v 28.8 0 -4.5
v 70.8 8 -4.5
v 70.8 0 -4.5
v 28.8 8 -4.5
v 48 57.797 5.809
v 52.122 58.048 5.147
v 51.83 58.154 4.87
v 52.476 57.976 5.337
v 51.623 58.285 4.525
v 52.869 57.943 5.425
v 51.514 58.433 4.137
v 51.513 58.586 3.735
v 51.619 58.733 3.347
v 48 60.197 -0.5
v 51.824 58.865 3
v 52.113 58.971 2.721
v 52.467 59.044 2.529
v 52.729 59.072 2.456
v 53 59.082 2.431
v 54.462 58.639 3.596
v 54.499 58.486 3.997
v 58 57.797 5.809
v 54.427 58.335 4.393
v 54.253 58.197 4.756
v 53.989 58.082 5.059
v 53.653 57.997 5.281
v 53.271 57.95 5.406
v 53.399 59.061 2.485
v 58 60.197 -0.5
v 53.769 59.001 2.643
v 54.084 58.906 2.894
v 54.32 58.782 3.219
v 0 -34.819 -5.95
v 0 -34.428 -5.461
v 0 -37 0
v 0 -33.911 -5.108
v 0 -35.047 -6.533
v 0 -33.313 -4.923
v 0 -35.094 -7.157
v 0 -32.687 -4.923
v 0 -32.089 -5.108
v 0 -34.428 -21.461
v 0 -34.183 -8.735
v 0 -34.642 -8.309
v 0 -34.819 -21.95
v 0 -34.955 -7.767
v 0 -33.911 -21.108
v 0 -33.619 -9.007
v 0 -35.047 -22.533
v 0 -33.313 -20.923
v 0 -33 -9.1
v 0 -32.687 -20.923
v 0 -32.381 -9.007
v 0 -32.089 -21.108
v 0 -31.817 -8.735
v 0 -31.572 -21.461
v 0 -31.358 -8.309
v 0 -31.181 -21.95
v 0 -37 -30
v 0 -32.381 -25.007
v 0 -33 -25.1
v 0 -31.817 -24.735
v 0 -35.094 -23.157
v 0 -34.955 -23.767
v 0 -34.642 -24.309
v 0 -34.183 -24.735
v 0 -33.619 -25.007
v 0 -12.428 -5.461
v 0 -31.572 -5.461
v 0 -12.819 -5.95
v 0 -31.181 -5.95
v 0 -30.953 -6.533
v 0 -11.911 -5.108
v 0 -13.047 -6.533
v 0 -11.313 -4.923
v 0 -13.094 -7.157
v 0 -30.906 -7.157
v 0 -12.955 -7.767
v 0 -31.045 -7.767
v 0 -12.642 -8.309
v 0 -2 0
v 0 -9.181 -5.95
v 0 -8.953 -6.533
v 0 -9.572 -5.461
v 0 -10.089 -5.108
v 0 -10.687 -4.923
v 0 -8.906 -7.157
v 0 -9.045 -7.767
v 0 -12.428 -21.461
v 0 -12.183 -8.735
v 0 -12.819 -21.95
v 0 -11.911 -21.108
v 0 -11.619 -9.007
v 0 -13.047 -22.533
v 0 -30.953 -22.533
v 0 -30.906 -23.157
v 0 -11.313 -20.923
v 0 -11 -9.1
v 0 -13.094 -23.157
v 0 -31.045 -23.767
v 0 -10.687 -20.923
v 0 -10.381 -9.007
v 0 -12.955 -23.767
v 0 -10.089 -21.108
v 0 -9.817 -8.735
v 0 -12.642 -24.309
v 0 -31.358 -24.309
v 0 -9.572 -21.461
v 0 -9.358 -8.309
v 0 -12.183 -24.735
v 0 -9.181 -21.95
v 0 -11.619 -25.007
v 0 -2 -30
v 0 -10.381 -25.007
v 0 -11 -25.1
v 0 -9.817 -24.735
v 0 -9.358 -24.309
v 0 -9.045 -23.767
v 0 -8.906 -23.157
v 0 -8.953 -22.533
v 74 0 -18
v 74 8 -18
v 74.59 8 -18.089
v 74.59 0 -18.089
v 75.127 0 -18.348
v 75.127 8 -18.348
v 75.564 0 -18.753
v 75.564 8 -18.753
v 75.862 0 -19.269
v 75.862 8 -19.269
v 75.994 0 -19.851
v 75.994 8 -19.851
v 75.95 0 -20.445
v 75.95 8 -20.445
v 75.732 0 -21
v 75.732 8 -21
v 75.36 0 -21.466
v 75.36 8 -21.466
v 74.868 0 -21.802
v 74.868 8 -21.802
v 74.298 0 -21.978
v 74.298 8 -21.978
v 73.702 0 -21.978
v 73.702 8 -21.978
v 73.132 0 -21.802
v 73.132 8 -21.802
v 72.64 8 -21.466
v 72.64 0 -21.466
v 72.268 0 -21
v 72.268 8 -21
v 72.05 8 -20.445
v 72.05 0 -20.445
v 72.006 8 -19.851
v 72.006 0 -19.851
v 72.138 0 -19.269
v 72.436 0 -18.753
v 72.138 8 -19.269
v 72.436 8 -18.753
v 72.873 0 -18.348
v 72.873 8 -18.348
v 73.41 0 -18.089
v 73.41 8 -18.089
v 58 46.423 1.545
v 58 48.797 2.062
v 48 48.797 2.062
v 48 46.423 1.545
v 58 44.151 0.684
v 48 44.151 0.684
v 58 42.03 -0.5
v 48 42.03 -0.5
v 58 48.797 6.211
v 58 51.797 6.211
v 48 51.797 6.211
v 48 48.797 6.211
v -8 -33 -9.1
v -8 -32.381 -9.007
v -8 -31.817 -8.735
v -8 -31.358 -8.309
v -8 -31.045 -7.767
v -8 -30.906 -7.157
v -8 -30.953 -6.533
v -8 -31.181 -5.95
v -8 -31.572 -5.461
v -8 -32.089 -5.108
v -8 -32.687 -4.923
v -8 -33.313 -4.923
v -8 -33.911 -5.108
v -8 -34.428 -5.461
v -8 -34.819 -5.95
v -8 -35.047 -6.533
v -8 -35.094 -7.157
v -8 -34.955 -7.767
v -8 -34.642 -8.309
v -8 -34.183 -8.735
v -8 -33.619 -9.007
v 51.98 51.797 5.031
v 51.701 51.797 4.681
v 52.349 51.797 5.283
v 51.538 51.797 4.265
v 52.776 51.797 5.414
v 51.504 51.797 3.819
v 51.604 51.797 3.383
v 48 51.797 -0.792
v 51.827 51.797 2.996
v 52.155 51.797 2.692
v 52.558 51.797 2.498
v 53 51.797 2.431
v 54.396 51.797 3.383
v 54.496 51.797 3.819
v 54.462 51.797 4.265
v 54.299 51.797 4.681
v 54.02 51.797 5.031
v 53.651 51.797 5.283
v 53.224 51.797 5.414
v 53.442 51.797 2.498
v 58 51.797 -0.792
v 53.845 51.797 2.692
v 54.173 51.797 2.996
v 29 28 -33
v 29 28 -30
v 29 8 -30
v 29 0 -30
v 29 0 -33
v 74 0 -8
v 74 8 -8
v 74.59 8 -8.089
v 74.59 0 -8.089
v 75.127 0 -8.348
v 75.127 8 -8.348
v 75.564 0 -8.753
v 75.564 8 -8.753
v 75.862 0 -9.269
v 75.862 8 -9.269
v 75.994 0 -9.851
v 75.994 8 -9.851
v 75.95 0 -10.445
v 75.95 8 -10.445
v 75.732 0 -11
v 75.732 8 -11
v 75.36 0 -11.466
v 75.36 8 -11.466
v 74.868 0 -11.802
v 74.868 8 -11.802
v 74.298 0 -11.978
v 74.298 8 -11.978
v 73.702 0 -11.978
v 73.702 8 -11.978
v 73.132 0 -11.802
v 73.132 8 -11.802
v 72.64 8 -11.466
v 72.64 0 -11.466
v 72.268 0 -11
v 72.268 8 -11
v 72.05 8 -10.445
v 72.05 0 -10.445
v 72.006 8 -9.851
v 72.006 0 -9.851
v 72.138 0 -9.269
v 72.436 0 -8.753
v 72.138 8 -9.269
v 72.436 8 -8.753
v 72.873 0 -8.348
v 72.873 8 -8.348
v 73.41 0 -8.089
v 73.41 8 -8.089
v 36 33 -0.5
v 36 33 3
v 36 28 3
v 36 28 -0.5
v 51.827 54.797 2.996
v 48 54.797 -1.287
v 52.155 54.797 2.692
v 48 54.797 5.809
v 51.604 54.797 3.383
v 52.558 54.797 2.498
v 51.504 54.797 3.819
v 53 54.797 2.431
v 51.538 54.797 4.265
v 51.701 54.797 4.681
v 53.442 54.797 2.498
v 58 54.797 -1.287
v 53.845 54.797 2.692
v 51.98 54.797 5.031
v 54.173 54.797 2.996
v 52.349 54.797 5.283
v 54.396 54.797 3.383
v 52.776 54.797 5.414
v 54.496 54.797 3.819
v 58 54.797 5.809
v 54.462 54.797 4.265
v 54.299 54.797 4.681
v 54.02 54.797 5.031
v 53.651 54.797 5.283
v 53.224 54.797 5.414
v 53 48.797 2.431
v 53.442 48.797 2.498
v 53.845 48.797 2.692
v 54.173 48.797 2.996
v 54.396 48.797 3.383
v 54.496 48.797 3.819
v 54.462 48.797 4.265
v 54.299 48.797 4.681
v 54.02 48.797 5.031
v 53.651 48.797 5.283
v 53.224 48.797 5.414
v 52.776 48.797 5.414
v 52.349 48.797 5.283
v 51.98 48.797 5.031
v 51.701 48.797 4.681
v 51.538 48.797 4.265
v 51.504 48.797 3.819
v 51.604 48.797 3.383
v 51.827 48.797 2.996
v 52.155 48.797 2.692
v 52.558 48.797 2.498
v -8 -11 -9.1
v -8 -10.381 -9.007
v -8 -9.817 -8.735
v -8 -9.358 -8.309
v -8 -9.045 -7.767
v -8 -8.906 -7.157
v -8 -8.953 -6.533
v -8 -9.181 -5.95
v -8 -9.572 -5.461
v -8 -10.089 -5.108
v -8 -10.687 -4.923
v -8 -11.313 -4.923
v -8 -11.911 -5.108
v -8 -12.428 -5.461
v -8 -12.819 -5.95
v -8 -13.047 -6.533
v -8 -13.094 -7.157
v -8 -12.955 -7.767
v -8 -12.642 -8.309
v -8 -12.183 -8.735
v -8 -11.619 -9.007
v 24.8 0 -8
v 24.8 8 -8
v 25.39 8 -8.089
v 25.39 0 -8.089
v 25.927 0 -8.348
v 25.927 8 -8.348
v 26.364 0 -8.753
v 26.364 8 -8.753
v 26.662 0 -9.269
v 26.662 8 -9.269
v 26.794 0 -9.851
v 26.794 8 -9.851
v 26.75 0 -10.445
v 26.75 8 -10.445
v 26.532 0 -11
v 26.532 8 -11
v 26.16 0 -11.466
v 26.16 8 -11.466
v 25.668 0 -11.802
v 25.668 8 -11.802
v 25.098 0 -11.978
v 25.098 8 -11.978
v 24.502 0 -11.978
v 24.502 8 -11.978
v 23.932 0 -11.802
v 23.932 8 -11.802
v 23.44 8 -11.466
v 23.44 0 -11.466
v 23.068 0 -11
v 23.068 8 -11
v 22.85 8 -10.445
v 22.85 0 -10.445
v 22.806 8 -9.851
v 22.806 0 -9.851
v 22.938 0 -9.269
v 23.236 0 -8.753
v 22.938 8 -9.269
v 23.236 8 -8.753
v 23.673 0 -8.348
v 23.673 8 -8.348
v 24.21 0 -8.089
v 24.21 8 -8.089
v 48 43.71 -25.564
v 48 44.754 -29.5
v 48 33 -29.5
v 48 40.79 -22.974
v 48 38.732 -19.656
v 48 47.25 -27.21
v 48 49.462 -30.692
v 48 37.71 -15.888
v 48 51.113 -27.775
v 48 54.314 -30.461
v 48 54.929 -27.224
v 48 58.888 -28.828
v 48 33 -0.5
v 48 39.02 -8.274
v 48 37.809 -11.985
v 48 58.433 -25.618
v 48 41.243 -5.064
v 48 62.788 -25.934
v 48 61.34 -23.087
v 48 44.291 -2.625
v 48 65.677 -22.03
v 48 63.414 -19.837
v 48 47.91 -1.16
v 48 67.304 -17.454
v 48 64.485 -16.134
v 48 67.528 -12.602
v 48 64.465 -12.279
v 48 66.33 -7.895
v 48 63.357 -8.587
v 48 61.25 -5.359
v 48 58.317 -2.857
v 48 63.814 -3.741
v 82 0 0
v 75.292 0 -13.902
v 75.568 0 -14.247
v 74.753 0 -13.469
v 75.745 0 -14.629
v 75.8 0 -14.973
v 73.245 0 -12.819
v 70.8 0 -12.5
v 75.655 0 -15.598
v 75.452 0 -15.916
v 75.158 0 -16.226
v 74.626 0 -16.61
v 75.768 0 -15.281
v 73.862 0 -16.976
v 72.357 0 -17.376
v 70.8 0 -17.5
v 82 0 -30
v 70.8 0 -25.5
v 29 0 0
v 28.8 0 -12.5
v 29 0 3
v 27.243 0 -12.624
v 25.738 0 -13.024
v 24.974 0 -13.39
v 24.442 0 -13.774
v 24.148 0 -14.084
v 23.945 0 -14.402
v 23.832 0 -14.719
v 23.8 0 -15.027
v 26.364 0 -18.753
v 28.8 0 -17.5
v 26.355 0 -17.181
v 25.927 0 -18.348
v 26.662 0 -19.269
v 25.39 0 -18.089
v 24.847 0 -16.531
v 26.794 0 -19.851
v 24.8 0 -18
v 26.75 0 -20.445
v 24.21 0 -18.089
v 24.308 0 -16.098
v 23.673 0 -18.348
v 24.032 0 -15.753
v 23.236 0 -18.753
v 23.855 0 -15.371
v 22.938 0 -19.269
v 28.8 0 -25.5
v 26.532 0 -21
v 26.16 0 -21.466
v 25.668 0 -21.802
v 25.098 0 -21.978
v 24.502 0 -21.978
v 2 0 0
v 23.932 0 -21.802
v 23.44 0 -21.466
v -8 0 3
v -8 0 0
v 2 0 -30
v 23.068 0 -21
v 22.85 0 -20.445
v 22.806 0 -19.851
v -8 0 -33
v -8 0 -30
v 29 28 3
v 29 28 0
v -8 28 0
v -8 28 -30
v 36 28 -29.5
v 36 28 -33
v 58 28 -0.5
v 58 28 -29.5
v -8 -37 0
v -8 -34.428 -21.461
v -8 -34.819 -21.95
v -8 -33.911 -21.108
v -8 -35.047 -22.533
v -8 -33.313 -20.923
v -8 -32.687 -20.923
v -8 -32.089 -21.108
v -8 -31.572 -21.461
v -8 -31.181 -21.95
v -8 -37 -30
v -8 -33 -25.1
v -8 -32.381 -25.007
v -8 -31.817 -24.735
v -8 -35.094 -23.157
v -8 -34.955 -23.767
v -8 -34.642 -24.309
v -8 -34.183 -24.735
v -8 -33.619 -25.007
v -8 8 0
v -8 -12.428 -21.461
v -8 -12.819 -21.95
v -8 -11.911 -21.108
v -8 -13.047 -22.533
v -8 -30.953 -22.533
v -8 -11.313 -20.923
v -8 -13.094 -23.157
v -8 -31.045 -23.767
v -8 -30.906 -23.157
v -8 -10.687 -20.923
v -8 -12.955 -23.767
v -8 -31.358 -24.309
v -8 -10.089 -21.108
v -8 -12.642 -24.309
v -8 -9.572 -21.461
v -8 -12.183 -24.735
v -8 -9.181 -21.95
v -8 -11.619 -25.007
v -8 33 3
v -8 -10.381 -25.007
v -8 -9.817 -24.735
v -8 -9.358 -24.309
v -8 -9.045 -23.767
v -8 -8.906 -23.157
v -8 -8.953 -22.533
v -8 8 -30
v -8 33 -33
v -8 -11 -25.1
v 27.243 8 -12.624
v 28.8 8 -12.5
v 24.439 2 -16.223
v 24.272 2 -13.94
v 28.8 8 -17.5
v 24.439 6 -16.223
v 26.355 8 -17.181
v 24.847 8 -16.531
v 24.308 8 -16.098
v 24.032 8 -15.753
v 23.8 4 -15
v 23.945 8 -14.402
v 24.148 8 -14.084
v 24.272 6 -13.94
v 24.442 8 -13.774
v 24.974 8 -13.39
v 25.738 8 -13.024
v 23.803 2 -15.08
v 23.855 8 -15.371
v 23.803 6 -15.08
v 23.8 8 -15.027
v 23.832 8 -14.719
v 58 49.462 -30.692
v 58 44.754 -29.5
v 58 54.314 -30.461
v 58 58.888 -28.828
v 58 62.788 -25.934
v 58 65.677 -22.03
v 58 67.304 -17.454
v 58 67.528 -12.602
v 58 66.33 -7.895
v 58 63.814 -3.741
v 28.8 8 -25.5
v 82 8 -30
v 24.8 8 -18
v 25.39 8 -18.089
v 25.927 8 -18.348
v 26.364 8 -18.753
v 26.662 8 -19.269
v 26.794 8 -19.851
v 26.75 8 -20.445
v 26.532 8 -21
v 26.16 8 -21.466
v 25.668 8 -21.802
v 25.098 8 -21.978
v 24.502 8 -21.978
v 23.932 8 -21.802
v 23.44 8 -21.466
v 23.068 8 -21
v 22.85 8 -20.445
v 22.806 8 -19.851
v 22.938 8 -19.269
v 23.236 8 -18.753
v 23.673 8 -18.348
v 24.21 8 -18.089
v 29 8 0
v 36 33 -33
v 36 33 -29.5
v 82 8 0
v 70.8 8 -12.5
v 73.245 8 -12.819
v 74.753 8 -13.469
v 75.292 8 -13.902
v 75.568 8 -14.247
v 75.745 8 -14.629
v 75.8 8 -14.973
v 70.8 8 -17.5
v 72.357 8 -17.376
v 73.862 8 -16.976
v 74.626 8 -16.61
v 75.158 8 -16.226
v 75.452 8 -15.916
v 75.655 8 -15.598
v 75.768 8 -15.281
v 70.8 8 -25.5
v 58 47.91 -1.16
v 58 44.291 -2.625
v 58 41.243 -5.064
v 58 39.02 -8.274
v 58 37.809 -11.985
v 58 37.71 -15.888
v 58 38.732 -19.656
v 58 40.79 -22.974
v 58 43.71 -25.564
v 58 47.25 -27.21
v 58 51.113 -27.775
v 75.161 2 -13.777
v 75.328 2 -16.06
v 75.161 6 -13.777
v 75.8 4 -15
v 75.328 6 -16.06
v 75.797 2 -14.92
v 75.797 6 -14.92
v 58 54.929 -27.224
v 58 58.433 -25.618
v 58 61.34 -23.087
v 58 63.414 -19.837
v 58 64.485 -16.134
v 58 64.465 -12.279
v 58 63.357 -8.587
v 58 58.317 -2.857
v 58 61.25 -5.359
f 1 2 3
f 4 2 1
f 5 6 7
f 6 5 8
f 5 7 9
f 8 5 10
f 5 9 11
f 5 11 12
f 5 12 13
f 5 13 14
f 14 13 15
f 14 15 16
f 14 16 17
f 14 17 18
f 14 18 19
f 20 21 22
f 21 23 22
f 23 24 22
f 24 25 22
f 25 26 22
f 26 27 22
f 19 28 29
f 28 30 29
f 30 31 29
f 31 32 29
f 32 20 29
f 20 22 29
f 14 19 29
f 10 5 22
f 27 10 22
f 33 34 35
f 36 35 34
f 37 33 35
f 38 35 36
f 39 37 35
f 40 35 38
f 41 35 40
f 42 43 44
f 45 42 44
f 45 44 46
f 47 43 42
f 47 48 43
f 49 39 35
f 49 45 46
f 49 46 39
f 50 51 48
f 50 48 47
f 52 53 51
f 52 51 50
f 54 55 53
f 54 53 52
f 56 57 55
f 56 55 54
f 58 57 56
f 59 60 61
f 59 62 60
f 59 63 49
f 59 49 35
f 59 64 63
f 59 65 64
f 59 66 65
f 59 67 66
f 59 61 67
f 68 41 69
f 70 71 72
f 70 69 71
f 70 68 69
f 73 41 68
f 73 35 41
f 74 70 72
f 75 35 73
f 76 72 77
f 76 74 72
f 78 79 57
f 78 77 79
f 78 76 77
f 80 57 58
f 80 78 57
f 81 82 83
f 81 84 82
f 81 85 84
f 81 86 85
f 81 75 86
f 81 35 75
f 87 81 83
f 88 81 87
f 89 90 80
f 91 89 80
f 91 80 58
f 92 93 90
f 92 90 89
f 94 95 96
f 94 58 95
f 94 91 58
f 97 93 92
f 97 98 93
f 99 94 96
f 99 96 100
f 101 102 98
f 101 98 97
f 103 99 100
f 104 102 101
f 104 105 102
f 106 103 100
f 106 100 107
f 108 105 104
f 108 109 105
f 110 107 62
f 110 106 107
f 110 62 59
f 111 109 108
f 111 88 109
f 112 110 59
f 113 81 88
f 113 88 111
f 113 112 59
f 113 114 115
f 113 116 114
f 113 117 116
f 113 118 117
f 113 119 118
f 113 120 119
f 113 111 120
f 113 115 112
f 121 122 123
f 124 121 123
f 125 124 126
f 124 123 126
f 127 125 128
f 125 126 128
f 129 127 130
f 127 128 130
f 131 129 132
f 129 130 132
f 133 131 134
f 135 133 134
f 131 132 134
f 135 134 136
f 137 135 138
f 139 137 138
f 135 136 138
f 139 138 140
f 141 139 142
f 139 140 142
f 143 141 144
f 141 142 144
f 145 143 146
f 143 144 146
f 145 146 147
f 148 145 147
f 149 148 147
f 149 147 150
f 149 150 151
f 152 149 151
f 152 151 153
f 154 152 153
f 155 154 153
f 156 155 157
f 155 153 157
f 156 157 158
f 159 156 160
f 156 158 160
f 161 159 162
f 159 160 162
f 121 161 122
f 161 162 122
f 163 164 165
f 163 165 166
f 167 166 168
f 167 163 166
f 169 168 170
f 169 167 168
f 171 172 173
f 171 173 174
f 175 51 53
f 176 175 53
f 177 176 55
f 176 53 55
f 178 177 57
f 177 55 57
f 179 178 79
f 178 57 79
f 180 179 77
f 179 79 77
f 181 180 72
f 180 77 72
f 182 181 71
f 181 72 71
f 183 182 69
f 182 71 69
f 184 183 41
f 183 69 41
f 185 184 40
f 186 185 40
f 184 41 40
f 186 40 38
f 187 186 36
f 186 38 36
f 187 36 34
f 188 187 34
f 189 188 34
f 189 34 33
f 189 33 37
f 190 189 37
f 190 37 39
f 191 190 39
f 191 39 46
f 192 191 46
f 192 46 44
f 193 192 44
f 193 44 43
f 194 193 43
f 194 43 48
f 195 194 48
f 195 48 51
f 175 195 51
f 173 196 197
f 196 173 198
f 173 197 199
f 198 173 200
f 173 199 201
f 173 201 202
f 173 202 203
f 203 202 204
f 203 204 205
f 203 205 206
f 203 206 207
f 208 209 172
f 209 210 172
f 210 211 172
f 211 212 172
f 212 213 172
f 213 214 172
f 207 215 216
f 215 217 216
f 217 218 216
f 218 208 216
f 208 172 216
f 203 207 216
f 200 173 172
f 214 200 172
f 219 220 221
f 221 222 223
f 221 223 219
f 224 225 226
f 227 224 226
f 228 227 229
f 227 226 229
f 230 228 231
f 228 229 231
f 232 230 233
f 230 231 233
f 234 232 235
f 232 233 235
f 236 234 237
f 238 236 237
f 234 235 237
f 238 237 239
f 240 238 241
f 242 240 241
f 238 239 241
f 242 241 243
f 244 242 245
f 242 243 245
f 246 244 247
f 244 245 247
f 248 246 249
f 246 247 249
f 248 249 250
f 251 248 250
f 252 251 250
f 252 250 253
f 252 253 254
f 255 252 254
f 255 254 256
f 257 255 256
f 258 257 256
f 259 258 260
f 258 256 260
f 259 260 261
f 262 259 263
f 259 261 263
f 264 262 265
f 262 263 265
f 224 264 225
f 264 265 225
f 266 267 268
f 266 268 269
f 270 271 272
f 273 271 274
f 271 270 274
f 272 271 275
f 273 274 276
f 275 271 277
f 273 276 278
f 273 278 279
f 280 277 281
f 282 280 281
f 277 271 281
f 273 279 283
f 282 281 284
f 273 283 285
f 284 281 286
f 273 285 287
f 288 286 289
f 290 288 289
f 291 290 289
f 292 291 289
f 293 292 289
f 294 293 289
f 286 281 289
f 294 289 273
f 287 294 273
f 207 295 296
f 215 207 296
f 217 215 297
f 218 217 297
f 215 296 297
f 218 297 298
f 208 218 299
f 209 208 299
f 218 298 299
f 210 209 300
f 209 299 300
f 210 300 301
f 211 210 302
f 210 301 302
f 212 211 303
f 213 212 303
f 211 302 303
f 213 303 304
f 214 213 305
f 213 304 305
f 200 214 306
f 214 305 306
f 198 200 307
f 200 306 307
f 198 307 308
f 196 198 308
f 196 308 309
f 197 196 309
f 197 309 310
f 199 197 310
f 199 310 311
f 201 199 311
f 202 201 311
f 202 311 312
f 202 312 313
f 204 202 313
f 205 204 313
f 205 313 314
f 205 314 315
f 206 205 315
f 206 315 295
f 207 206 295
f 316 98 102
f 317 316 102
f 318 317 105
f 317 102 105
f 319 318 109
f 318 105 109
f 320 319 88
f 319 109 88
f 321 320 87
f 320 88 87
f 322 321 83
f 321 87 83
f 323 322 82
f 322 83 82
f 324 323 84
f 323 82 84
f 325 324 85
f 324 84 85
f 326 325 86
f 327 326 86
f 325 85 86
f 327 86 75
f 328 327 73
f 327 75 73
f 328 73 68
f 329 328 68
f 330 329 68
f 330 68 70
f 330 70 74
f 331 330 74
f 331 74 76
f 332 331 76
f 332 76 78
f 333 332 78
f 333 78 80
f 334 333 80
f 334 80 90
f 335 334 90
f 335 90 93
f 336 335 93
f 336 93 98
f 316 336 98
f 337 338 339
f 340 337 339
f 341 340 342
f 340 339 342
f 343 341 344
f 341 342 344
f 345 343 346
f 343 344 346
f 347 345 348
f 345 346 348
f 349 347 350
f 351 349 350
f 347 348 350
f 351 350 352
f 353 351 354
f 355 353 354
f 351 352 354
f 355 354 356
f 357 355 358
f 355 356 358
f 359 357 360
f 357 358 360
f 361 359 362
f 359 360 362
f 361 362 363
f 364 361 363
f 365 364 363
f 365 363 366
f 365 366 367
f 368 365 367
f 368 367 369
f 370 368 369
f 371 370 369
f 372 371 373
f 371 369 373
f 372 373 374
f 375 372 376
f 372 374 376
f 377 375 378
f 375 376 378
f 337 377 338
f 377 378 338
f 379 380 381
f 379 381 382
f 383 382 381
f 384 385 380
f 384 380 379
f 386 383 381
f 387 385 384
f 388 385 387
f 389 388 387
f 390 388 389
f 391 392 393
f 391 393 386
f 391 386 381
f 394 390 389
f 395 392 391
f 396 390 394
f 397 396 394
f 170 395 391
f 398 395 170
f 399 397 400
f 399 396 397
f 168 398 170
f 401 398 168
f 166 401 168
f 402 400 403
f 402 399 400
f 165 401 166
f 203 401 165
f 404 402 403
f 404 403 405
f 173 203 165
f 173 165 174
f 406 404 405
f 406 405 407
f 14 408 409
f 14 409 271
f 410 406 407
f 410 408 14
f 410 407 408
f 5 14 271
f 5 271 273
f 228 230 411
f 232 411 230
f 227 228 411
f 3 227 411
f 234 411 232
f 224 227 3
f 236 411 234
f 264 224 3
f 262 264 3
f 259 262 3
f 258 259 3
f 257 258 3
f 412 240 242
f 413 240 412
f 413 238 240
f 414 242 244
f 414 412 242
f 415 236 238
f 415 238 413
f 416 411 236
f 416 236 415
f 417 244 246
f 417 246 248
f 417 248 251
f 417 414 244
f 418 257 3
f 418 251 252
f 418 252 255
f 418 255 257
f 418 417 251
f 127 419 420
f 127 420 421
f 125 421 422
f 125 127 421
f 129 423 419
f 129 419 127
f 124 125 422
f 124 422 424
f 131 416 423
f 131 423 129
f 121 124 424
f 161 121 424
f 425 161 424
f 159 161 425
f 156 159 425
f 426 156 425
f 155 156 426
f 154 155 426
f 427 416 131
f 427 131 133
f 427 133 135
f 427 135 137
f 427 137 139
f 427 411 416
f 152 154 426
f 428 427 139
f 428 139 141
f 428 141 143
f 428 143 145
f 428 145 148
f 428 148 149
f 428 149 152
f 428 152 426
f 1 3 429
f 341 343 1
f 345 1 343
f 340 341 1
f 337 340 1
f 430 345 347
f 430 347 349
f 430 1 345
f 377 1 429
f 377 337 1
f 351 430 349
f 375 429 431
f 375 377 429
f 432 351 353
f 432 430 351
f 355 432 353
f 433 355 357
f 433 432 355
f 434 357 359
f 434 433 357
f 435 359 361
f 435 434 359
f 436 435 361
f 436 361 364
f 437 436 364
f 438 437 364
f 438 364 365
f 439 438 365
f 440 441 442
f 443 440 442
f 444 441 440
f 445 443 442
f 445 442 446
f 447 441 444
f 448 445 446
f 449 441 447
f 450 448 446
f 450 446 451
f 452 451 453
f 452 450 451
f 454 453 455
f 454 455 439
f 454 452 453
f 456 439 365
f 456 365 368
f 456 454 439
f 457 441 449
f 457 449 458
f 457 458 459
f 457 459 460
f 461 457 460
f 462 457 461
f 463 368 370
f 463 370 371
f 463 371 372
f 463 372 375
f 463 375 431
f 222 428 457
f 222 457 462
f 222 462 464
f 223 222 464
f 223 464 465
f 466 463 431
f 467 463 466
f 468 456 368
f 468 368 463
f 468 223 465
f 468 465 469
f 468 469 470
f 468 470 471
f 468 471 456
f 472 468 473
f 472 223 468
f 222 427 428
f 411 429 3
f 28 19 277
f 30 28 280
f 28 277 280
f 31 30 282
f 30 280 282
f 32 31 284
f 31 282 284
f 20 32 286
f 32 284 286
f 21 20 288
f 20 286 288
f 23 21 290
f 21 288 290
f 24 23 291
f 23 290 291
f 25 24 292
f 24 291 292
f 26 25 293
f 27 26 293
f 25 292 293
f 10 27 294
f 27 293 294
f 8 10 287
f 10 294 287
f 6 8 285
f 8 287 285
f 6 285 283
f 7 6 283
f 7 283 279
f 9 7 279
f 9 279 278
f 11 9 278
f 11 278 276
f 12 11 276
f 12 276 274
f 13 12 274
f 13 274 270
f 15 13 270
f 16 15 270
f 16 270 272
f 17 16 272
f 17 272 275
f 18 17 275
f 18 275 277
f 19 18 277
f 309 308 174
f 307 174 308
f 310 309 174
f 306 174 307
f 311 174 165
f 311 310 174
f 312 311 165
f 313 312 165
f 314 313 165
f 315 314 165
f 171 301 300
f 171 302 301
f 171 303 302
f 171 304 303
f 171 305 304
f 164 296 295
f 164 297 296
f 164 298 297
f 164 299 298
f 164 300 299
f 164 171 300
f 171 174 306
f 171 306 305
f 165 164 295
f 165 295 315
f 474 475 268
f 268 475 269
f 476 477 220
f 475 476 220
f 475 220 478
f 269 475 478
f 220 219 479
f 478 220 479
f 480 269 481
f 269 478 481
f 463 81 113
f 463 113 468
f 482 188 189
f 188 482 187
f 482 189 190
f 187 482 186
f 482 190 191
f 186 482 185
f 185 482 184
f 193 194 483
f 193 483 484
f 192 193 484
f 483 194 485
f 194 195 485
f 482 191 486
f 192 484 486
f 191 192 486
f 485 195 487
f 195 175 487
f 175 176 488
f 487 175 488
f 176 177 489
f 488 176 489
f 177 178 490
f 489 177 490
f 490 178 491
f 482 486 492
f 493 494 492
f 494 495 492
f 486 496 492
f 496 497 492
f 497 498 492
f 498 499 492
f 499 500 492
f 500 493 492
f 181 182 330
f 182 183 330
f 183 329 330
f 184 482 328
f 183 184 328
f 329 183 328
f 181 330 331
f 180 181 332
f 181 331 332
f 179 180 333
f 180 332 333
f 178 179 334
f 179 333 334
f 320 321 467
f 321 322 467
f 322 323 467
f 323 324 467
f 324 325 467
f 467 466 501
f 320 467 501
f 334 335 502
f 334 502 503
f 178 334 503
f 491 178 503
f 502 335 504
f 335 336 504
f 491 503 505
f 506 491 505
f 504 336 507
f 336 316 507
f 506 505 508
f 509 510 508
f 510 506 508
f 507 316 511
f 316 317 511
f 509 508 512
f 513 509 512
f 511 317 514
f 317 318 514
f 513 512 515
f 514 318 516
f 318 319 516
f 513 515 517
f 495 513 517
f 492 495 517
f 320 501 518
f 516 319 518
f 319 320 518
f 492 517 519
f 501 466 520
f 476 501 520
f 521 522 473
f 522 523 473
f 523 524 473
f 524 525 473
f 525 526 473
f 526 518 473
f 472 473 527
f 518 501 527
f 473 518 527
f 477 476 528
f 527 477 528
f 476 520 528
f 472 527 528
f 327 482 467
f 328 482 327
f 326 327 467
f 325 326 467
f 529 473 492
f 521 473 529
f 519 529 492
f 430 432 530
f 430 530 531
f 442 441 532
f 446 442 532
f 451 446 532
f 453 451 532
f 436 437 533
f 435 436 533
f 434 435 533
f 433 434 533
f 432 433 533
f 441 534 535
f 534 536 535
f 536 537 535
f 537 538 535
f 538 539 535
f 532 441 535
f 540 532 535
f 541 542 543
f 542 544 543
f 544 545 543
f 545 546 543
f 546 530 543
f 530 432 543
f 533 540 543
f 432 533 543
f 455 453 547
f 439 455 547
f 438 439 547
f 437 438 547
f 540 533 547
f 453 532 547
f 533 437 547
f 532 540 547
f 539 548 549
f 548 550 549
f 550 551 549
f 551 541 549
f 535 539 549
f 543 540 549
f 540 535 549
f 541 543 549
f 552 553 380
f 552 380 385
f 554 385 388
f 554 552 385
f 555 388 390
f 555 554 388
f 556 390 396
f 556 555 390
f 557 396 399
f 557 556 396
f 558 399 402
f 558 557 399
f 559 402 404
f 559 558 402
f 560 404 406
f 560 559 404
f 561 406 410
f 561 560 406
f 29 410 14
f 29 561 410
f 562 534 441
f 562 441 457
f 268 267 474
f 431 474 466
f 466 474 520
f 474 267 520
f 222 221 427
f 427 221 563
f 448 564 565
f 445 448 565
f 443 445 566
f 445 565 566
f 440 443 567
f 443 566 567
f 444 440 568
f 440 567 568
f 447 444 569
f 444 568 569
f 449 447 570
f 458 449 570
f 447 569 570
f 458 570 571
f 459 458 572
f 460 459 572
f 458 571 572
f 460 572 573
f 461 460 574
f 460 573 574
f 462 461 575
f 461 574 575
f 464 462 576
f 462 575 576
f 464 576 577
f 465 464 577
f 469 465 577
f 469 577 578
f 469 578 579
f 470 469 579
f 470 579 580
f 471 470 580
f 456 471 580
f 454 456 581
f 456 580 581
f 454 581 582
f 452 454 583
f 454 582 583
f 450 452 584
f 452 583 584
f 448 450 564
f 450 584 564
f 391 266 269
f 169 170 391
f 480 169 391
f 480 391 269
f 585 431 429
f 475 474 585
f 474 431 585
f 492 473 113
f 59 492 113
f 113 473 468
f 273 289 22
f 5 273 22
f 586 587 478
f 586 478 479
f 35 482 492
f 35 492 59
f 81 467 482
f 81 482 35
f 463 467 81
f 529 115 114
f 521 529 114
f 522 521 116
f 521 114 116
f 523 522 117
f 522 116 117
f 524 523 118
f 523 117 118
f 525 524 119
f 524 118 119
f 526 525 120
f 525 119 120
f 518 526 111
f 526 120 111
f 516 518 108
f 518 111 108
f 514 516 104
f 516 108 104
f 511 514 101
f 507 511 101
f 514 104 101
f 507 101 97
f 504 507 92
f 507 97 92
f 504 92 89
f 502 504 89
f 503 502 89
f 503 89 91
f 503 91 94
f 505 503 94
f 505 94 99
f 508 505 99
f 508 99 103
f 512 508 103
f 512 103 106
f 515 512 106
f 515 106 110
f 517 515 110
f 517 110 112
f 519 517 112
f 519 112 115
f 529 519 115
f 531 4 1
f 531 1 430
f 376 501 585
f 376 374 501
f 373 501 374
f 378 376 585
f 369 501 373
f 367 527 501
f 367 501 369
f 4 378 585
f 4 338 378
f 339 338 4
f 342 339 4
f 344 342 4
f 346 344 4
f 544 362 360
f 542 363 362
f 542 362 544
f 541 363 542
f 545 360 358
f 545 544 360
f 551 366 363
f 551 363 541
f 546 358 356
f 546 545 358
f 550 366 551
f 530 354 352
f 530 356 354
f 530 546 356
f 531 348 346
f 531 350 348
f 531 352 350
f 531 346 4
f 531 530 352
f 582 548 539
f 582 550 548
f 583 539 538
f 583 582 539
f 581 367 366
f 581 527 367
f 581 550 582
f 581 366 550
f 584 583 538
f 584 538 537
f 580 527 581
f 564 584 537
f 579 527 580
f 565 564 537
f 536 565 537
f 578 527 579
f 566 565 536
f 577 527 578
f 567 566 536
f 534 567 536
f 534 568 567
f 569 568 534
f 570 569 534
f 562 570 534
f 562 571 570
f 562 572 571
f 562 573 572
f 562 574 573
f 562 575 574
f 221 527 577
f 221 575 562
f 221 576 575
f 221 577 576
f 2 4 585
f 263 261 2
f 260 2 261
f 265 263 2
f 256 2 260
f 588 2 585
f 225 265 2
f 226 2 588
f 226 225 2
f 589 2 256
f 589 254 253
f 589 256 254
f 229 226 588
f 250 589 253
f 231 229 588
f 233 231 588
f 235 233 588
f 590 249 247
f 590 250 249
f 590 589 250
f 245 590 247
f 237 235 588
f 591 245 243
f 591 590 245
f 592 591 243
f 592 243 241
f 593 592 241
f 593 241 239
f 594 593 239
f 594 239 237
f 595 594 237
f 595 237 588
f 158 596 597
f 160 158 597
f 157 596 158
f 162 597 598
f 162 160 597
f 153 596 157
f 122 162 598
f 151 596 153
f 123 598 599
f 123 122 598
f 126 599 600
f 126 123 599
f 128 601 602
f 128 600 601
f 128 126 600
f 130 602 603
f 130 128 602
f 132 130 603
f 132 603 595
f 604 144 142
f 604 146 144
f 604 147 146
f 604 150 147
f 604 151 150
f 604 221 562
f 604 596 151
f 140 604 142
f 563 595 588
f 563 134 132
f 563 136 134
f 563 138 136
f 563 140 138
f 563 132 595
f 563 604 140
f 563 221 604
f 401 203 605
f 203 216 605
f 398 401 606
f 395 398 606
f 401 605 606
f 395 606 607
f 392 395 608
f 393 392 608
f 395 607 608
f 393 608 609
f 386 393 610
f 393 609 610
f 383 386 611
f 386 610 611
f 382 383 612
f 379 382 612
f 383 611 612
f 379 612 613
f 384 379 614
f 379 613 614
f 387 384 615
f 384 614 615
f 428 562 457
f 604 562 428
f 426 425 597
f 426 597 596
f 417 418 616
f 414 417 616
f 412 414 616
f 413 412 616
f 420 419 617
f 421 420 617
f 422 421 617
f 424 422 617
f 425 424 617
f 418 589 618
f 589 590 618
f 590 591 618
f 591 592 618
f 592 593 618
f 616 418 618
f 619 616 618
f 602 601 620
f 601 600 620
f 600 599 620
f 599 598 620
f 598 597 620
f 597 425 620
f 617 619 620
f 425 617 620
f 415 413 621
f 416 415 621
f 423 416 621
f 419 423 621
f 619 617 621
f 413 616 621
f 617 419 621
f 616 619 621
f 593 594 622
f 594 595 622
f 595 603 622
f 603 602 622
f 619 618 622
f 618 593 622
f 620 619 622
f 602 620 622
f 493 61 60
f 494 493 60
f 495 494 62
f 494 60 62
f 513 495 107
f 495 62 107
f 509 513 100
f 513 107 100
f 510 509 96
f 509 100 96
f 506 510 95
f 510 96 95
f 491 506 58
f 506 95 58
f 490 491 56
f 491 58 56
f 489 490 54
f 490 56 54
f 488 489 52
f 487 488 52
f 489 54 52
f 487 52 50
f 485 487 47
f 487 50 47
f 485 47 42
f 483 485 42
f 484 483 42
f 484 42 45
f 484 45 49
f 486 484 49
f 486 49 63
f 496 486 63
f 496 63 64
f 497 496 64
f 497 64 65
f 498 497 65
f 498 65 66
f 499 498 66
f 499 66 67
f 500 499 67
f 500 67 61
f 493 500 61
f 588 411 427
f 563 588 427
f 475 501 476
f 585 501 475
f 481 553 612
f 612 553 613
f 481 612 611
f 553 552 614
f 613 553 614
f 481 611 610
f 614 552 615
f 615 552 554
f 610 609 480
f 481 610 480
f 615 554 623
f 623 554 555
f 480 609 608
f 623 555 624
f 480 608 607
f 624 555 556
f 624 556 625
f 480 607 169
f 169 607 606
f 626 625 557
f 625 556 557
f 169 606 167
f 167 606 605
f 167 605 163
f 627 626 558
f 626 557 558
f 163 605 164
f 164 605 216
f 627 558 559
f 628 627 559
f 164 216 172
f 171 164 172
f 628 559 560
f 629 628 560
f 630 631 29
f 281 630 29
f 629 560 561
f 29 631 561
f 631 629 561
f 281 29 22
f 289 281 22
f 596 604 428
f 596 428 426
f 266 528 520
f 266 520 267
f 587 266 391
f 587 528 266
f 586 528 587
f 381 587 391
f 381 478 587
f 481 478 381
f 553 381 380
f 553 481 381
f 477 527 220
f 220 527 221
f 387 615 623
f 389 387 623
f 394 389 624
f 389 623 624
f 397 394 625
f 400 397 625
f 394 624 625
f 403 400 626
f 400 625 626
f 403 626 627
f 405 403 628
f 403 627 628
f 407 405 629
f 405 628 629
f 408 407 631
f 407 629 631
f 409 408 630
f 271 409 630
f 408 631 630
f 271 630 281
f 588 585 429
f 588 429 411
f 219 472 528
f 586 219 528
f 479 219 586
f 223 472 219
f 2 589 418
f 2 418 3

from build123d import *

# Parameters (mm, degrees)
SKETCH_1_W          = 82
SKETCH_1_H          = 30
EXTRUDE_1_DEPTH     = 8
SKETCH_2_R          = 2
CUT_EXTRUDE_1_DEPTH = 8
SKETCH_4_W          = 8
SKETCH_4_H          = 30
EXTRUDE_2_DEPTH     = 45
EXTRUDE_5_DEPTH     = 30
SKETCH_15_R         = 2.1
CUT_EXTRUDE_2_DEPTH = 10
SKETCH_17_W         = 37
SKETCH_17_H         = 3
EXTRUDE_6_DEPTH     = 20
EXTRUDE_6_2_DEPTH   = 20
SKETCH_18_W         = 66
SKETCH_18_H         = 36
EXTRUDE_7_DEPTH     = 5
SKETCH_19_W         = 37
SKETCH_19_H         = 3
EXTRUDE_8_DEPTH     = 8
SKETCH_20_W         = 22
SKETCH_20_H         = 3.5
CUT_EXTRUDE_3_DEPTH = 5
SKETCH_21_R         = 16.5
SKETCH_21_R_2       = 13.5
EXTRUDE_9_DEPTH     = 10
SKETCH_22_W         = 9.765091575
SKETCH_22_H         = 3
CUT_EXTRUDE_4_DEPTH = 10
EXTRUDE_10_DEPTH    = 10
SKETCH_24_R         = 1.5
CUT_EXTRUDE_5_DEPTH = 15


with BuildPart() as part:
    # 草圖1 → 填料-伸長1 (new body)
    with BuildSketch(Plane(origin=(0, 0, 0), x_dir=(1, 0, 0), z_dir=(0, 1, 0))):
        with Locations((41, 15)):
            Rectangle(SKETCH_1_W, SKETCH_1_H)
    extrude(amount=EXTRUDE_1_DEPTH)

    # 草圖2 → 除料-伸長1 (cut)
    with BuildSketch(Plane(origin=(0, 8, 0), x_dir=(1, 0, 0), z_dir=(0, 1, 0))):
        with Locations(Location((74, 20, 0), (0, 0, 270))):
            Circle(SKETCH_2_R)
        with Locations(Location((74, 10, 0), (0, 0, 270))):
            Circle(SKETCH_2_R)
        with Locations(Location((24.8, 20, 0), (0, 0, 270))):
            Circle(SKETCH_2_R)
        with Locations(Location((24.8, 10, 0), (0, 0, 270))):
            Circle(SKETCH_2_R)
        with BuildLine():
            Line((28.8, 25.5), (70.8, 25.5))
            Line((70.8, 25.5), (70.8, 17.5))
            add(Edge.make_bspline(
                [(70.8, 12.5), (75.8, 12.5), (75.8, 15), (75.8, 17.5), (70.8, 17.5)],
                knots=[4.71238898, 4.71238898, 4.71238898, 6.283185307, 6.283185307, 7.853981634, 7.853981634, 7.853981634], degree=2, weights=[1, 0.707106781, 1, 0.707106781, 1]))
            Line((70.8, 12.5), (70.8, 4.5))
            Line((70.8, 4.5), (28.8, 4.5))
            Line((28.8, 4.5), (28.8, 12.5))
            add(Edge.make_bspline(
                [(28.8, 17.5), (23.8, 17.5), (23.8, 15), (23.8, 12.5), (28.8, 12.5)],
                knots=[1.570796327, 1.570796327, 1.570796327, 3.141592654, 3.141592654, 4.71238898, 4.71238898, 4.71238898], degree=2, weights=[1, 0.707106781, 1, 0.707106781, 1]))
            Line((28.8, 17.5), (28.8, 25.5))
        make_face()
    extrude(amount=-CUT_EXTRUDE_1_DEPTH, mode=Mode.SUBTRACT)

    # 草圖4 → 填料-伸長2 (add)
    with BuildSketch(Plane(origin=(0, 8, 0), x_dir=(1, 0, 0), z_dir=(0, 1, 0))):
        with Locations((-4, 15)):
            Rectangle(SKETCH_4_W, SKETCH_4_H)
    extrude(amount=-EXTRUDE_2_DEPTH)

    # 草圖14 → 填料-伸長5 (add)
    with BuildSketch(Plane.XY):
        Polygon((0, 0), (0, -2), (2, 0), align=None)
    extrude(amount=-EXTRUDE_5_DEPTH)

    # 草圖15 → 除料-伸長2 (cut)
    with BuildSketch(Plane(origin=(0, 0, 0), x_dir=(0, 0, -1), z_dir=(1, 0, 0))):
        with Locations((7, -33)):
            Circle(SKETCH_15_R)
        with Locations((7, -11)):
            Circle(SKETCH_15_R)
        with Locations((23, -11)):
            Circle(SKETCH_15_R)
        with Locations((23, -33)):
            Circle(SKETCH_15_R)
    extrude(amount=-CUT_EXTRUDE_2_DEPTH, mode=Mode.SUBTRACT)



with BuildPart() as body_2:
    # 草圖17 → 填料-伸長6 (new body)
    with BuildSketch(Plane(origin=(0, 8, 0), x_dir=(1, 0, 0), z_dir=(0, 1, 0))):
        with Locations((10.5, -1.5)):
            Rectangle(SKETCH_17_W, SKETCH_17_H)
    extrude(amount=EXTRUDE_6_DEPTH)



with BuildPart() as body_3:
    # 草圖17 → Extrude 6 2 (new body)
    with BuildSketch(Plane(origin=(0, 8, 0), x_dir=(1, 0, 0), z_dir=(0, 1, 0))):
        with Locations((10.5, 31.5)):
            Rectangle(SKETCH_17_W, SKETCH_17_H)
    extrude(amount=EXTRUDE_6_2_DEPTH)


with BuildPart() as body_2_1:
    add(body_2.part)

    add(body_3.part)  # 填料-伸長7 merges body 3
    # 草圖18 → 填料-伸長7 (add)
    with BuildSketch(Plane(origin=(0, 28, 0), x_dir=(1, 0, 0), z_dir=(0, 1, 0))):
        with Locations((25, 15)):
            Rectangle(SKETCH_18_W, SKETCH_18_H)
    extrude(amount=EXTRUDE_7_DEPTH)


with BuildPart() as part_1:
    add(part.part)

    add(body_2_1.part)  # 填料-伸長8 merges body 2
    # 草圖19 → 填料-伸長8 (add)
    with BuildSketch(Plane(origin=(0, 8, 0), x_dir=(-1, 0, 0), z_dir=(0, -1, 0))):
        with Locations((-10.5, -1.5)):
            Rectangle(SKETCH_19_W, SKETCH_19_H)
        with Locations((-10.5, 31.5)):
            Rectangle(SKETCH_19_W, SKETCH_19_H)
    extrude(amount=EXTRUDE_8_DEPTH)

    # 草圖20 → 除料-伸長3 (cut)
    with BuildSketch(Plane(origin=(0, 33, 0), x_dir=(1, 0, 0), z_dir=(0, 1, 0))):
        with Locations((47, 31.25)):
            Rectangle(SKETCH_20_W, SKETCH_20_H)
        with Locations((47, -1.25)):
            Rectangle(SKETCH_20_W, SKETCH_20_H)
    extrude(amount=-CUT_EXTRUDE_3_DEPTH, mode=Mode.SUBTRACT)



with BuildPart() as body_2_2:
    # 草圖21 → 填料-伸長9 (new body)
    with BuildSketch(Plane(origin=(58, 0, 0), x_dir=(0, 0, -1), z_dir=(1, 0, 0))):
        with Locations((14.274721253, 51.113330164)):
            Circle(SKETCH_21_R)
        with Locations((14.274721253, 51.113330164)):
            Circle(SKETCH_21_R_2, mode=Mode.SUBTRACT)
    extrude(amount=-EXTRUDE_9_DEPTH)

    # 草圖22 → 除料-伸長4 (cut)
    with BuildSketch(Plane(origin=(58, 0, 0), x_dir=(0, 0, -1), z_dir=(1, 0, 0))):
        with Locations((-2.130977474, 53.296710416)):
            Rectangle(SKETCH_22_W, SKETCH_22_H)
    extrude(amount=-CUT_EXTRUDE_4_DEPTH, mode=Mode.SUBTRACT)


with BuildPart() as part_2:
    add(part_1.part)

    add(body_2_2.part)  # 填料-伸長10 merges body 2 2
    # 草圖23 → 填料-伸長10 (add)
    with BuildSketch(Plane(origin=(58, 0, 0), x_dir=(0, 0, -1), z_dir=(1, 0, 0))):
        Polygon((-1.808894943, 54.796710416), (-5.808894943, 54.796710416), (-5.808894943, 57.796710416), (0.5, 60.19666955), align=None)
        Polygon((-2.211120899, 51.796710416), (-6.211120899, 51.796710416), (-6.211120899, 48.796710416), (-2.061841205, 48.796710416), align=None)
        Polygon((0.5, 42.029990777), (0.5, 33), (29.5, 33), (29.5, 44.75401518), (27.62078064, 41.411129443), (13.64058676, 34.62552032), align=None)
    extrude(amount=-EXTRUDE_10_DEPTH)

    # 草圖24 → 除料-伸長5 (cut)
    with BuildSketch(Plane(origin=(0, 48.796710416, 0), x_dir=(-1, 0, 0), z_dir=(0, -1, 0))):
        with Locations(Location((-53, -3.931120899, 0), (0, 0, 90))):
            Circle(SKETCH_24_R)
    extrude(amount=-CUT_EXTRUDE_5_DEPTH, mode=Mode.SUBTRACT)


solid = part_2.part
